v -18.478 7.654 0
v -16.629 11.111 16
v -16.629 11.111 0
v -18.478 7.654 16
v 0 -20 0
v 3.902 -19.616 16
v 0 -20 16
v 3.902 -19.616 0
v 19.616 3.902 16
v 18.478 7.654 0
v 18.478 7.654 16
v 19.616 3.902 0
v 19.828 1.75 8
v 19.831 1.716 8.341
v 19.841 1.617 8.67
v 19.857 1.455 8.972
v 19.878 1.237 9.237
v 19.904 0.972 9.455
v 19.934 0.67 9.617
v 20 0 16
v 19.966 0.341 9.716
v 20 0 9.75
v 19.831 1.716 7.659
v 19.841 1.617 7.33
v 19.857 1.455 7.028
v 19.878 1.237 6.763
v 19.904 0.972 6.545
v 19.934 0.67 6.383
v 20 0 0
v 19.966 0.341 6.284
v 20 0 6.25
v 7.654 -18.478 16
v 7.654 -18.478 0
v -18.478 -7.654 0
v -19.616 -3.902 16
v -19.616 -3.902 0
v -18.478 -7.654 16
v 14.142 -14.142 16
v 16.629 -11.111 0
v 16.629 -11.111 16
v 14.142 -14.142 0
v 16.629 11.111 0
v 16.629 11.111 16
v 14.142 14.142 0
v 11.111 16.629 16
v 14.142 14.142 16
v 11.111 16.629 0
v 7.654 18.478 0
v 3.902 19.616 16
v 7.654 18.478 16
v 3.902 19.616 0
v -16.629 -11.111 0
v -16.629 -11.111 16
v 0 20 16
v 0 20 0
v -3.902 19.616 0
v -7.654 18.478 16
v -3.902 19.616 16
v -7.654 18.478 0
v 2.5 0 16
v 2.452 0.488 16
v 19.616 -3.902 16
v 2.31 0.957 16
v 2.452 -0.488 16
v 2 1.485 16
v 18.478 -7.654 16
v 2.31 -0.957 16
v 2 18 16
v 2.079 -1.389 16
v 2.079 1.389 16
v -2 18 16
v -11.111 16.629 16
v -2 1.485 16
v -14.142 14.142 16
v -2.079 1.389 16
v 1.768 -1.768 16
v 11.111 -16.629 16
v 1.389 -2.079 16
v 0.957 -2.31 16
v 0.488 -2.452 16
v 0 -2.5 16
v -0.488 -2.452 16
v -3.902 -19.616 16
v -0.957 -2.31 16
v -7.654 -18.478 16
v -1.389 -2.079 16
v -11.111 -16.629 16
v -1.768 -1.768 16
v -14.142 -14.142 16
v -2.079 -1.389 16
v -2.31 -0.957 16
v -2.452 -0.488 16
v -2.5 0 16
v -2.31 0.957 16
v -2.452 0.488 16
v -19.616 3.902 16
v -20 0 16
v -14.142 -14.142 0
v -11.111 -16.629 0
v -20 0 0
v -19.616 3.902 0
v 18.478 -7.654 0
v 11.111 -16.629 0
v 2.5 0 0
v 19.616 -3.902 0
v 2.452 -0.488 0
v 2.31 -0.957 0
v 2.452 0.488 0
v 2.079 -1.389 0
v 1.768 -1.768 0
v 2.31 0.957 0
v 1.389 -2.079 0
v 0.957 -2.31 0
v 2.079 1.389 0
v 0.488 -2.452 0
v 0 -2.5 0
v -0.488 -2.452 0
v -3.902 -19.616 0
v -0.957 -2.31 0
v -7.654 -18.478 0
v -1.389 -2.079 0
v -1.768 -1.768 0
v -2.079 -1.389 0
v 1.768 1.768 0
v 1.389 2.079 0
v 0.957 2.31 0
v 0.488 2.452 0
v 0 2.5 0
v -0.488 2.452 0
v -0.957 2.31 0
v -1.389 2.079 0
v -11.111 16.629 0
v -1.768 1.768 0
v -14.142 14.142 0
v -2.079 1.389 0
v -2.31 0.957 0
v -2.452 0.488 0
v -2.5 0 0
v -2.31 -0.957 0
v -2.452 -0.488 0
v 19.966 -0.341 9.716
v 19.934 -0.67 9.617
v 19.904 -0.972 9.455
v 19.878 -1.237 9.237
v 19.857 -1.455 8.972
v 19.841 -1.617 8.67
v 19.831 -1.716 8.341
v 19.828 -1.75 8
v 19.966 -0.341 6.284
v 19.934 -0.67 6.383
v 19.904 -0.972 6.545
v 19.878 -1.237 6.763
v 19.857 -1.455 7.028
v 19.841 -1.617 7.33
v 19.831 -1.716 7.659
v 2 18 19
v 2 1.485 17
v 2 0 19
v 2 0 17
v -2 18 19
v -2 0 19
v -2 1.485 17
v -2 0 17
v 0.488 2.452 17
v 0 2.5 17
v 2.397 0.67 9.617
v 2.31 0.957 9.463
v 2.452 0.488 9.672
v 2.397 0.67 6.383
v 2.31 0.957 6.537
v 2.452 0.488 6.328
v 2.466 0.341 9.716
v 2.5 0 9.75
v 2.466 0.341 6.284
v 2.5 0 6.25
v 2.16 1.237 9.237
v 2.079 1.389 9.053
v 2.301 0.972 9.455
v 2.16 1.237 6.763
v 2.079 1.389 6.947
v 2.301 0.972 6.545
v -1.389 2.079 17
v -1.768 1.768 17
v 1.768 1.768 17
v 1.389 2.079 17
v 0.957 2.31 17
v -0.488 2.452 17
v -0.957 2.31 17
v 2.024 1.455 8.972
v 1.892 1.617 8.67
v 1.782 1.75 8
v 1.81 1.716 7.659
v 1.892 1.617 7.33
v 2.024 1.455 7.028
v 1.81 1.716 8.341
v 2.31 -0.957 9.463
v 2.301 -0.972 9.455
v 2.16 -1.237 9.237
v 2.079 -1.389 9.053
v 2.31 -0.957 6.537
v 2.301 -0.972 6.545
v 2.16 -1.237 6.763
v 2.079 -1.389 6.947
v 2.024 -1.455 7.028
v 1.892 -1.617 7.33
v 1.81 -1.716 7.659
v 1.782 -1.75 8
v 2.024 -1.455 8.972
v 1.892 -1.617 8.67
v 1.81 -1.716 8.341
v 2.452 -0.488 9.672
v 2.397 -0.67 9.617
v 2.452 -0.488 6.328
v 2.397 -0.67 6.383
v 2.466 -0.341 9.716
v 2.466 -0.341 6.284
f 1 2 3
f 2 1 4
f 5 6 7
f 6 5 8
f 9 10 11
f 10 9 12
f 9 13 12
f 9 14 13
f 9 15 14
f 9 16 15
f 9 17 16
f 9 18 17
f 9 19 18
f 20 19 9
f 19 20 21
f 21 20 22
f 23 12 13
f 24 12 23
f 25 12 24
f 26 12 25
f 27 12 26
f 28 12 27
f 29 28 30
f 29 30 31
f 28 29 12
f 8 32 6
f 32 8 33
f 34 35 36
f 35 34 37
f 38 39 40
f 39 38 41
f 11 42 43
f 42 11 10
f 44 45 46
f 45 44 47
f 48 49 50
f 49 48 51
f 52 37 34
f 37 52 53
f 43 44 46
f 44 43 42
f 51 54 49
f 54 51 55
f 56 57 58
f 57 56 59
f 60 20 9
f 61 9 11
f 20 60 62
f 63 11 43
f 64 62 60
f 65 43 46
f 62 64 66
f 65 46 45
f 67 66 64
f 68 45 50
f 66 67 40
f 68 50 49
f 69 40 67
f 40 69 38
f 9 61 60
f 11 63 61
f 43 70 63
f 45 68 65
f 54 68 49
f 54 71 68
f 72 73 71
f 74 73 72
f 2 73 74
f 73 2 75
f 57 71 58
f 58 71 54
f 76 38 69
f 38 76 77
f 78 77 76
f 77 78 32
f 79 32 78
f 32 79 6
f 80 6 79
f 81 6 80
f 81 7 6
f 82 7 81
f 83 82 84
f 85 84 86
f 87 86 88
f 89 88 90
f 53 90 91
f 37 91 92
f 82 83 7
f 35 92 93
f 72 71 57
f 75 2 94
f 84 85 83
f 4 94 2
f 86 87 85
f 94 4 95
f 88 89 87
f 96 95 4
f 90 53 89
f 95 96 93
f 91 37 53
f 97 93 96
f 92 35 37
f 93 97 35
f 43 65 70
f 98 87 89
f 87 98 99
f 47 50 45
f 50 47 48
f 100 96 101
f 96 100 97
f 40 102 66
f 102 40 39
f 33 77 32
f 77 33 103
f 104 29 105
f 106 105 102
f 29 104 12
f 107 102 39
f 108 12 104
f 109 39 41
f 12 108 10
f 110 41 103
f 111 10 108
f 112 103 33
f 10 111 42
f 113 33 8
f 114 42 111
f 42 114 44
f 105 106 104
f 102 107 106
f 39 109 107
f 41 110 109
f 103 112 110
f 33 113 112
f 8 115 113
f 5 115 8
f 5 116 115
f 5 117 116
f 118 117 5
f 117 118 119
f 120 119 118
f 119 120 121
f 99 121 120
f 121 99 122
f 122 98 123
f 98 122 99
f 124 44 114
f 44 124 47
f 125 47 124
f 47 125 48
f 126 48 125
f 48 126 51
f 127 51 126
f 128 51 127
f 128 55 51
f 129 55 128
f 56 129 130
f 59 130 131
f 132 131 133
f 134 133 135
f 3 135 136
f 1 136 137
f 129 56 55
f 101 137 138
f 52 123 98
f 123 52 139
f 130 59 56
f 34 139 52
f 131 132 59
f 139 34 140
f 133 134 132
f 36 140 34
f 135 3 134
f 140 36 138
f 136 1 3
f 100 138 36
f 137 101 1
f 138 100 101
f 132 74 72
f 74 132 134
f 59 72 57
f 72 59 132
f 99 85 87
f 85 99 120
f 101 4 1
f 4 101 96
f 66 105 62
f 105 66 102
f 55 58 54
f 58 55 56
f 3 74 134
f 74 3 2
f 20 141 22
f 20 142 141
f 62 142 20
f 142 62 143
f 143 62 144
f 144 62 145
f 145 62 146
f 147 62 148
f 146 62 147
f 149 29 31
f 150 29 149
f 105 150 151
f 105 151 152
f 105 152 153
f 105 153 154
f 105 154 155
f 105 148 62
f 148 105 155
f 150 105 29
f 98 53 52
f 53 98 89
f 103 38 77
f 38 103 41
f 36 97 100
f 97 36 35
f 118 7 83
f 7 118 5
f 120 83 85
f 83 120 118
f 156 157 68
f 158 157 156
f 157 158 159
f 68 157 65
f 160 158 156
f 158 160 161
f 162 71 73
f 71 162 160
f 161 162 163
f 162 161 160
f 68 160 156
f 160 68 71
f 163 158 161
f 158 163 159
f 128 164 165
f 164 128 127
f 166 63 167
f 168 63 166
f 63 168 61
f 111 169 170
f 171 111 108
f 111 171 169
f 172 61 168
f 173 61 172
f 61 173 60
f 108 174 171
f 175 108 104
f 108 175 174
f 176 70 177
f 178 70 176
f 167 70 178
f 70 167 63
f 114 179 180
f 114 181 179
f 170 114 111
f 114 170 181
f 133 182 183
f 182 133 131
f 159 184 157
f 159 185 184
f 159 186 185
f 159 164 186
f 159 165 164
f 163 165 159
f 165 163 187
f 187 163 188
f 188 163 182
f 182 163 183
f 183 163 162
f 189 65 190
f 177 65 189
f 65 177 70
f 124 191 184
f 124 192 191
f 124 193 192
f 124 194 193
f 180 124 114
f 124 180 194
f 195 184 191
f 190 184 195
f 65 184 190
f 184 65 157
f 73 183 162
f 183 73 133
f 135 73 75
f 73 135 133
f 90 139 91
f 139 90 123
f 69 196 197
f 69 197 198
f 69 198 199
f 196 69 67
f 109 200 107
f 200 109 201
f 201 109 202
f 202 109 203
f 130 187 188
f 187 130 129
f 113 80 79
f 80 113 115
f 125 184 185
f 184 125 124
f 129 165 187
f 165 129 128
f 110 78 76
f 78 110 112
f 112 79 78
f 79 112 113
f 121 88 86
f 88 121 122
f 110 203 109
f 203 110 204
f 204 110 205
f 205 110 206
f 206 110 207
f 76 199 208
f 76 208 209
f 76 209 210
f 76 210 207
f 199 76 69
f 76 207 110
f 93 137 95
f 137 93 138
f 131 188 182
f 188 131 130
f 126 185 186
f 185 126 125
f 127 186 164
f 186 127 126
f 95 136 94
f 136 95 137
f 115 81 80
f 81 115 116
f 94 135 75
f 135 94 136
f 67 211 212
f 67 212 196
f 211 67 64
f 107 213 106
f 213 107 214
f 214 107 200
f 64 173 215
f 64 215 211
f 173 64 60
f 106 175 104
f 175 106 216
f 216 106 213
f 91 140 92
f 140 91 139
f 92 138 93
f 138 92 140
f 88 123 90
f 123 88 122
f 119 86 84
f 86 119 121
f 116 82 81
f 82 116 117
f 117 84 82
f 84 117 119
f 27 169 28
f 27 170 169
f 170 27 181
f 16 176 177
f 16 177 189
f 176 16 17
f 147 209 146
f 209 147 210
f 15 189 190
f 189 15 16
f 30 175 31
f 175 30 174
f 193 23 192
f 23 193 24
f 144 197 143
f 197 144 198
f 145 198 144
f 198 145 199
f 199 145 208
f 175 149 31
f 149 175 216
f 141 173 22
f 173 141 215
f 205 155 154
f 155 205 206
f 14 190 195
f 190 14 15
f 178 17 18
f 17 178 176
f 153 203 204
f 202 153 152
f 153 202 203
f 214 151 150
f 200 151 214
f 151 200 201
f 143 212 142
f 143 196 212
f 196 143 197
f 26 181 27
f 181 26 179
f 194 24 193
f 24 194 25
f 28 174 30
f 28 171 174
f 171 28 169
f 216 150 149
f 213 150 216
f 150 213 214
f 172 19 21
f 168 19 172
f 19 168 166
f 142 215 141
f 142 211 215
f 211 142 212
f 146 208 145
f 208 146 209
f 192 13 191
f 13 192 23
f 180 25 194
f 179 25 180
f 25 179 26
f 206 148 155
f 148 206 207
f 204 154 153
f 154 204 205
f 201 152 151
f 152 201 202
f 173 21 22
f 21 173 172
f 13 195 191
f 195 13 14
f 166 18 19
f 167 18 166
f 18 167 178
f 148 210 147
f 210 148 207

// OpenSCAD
$fn = 32;

// ----------------------------------------------------------------------
// Control knob: pointer knob
// ----------------------------------------------------------------------

// --- parameters (mm) ---
rib_w = 4;                // pointer rib width
rib_h = 4;                // pointer rib height
knob_d = 40;              // knob body diameter
knob_h = 16;              // knob body height
bore_d = 5;               // shaft bore diameter
set_d = 3.5;              // set screw bore diameter

rib_poke = rib_h - 1;  // rib height above the top
total_h = knob_h + rib_h - 1;  // overall height

difference() {
  union() {
    cylinder(h = knob_h, d = knob_d);
    translate([-rib_w / 2, 0, knob_h - 1])
      cube([rib_w, knob_d / 2 - 2, rib_h]);
  }
  translate([0, 0, -1]) cylinder(h = knob_h + 2, d = bore_d);
  translate([-1, 0, knob_h / 2]) rotate([0, 90, 0])
    cylinder(h = knob_d / 2 + bore_d / 2 + 2, d = set_d);}
